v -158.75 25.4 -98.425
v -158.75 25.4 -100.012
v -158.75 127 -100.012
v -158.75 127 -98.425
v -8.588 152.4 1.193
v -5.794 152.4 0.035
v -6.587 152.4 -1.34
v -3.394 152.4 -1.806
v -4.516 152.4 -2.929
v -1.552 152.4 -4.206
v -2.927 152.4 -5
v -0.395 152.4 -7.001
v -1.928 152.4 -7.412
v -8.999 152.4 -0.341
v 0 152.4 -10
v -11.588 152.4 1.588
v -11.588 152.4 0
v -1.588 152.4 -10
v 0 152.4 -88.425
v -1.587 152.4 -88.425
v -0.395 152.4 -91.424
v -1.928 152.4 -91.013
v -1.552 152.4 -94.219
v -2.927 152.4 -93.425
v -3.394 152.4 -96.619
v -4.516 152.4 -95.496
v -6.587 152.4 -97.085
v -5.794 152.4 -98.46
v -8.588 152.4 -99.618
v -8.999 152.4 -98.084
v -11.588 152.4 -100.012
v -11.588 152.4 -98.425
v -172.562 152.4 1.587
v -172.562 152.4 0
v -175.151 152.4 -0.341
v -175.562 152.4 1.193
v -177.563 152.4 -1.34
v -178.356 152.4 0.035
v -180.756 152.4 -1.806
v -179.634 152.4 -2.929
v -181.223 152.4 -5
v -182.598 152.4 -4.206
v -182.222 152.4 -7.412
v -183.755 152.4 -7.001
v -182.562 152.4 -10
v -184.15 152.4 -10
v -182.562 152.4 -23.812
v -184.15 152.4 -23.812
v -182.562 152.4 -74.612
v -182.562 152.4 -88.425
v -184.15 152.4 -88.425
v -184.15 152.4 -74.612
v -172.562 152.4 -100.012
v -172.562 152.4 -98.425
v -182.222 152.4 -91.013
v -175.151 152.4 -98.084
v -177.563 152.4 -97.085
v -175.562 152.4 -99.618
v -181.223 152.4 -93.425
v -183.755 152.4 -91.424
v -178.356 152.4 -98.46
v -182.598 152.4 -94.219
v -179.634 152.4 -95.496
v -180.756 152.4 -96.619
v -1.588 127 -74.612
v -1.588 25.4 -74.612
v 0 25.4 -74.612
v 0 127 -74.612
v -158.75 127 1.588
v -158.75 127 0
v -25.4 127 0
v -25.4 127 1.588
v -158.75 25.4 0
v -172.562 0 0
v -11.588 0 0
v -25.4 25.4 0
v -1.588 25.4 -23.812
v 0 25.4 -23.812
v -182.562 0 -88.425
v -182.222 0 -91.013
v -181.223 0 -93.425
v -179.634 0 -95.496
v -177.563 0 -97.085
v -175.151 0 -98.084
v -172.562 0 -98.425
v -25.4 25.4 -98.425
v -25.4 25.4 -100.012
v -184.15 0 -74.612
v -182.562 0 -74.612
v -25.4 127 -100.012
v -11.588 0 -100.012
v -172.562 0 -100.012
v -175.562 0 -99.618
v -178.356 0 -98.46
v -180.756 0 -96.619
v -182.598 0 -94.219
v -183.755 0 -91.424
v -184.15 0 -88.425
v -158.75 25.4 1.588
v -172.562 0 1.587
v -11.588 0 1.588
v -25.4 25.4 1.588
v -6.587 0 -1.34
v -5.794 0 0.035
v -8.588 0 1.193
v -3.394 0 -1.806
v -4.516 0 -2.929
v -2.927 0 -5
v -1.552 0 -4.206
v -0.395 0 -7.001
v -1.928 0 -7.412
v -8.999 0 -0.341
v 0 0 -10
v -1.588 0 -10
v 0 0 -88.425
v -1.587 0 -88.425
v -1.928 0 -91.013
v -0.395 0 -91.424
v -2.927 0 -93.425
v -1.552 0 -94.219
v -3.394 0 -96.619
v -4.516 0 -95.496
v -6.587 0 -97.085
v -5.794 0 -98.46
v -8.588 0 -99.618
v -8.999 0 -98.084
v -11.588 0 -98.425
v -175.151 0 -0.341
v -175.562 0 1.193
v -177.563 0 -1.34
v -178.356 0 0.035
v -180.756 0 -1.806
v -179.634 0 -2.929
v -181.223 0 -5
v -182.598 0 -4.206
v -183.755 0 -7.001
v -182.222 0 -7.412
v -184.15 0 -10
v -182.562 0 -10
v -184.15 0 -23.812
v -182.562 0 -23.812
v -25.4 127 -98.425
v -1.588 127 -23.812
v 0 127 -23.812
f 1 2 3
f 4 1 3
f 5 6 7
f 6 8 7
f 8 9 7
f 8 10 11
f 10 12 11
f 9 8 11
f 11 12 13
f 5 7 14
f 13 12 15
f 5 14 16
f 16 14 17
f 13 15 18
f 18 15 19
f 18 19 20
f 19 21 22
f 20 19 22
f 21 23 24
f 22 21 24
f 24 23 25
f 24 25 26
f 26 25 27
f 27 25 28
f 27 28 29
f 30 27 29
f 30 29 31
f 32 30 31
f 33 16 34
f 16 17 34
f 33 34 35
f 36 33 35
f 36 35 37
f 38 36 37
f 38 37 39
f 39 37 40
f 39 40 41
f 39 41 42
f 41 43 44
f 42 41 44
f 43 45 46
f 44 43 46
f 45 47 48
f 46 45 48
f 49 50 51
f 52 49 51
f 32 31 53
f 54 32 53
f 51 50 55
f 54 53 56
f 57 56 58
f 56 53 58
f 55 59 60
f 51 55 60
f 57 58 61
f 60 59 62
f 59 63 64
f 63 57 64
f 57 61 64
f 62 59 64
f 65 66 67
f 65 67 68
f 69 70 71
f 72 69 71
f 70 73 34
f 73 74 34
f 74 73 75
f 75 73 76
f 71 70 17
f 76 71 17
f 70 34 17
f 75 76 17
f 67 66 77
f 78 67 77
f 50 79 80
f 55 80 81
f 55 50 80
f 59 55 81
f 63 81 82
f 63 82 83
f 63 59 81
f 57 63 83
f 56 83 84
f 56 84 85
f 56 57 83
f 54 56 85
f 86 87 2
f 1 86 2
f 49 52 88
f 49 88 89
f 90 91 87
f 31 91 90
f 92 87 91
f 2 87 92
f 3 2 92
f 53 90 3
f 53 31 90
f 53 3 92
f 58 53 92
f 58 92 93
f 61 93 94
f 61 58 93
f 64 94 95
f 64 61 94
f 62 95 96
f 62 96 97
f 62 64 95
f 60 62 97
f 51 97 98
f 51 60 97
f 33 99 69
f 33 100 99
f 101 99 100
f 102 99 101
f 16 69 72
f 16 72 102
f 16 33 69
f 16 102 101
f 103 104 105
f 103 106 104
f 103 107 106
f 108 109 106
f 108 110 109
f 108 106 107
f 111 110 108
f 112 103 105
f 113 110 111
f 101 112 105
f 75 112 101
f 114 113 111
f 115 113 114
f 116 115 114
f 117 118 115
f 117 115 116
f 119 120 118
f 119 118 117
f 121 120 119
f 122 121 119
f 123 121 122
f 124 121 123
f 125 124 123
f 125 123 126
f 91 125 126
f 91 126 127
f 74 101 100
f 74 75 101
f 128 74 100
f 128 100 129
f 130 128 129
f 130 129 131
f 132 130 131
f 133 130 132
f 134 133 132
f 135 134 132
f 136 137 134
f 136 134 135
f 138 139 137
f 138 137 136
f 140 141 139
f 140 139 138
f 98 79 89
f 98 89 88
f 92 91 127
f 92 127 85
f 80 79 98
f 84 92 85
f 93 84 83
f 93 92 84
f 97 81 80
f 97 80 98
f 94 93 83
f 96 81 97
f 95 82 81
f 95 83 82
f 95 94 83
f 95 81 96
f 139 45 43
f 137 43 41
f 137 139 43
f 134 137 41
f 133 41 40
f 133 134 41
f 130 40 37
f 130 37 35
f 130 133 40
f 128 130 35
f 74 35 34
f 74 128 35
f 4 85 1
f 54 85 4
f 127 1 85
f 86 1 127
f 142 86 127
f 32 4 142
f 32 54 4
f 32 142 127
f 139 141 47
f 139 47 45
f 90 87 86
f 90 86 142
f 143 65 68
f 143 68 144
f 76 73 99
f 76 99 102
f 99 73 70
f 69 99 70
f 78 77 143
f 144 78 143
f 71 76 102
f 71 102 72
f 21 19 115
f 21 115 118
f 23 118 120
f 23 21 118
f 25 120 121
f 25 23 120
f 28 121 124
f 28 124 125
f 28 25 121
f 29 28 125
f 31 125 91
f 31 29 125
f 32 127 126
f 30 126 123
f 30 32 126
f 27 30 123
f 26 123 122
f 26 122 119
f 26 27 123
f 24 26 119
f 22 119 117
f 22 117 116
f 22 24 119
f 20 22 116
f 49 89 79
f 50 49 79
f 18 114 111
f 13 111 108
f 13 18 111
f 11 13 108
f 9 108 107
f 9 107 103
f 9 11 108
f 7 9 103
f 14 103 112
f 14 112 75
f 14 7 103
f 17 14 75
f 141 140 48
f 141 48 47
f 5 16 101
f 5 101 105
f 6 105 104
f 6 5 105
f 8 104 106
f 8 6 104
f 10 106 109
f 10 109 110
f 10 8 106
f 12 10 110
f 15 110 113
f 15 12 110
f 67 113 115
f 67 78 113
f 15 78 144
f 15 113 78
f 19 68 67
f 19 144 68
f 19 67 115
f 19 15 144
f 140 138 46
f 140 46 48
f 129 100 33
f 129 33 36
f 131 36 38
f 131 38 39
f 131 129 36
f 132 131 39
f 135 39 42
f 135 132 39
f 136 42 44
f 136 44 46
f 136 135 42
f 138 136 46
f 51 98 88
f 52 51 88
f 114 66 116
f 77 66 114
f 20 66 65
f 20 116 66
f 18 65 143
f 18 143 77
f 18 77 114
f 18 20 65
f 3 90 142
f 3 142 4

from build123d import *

# Parameters (mm, degrees)
SKETCH1_W                    = 184.15
SKETCH1_H                    = 152.4
SKETCH1_W_2                  = 133.35
SKETCH1_H_2                  = 101.6
BOSS_EXTRUDE1_DEPTH          = 1.5875
EDGE_FLANGE1_STRIP_W         = 26.35
EDGE_FLANGE1_STRIP_H         = 1.5875
EDGE_FLANGE1_STRIP_CUT_DEPTH = 152.4
EDGE_FLANGE1_DEPTH           = 152.4
EDGE_FLANGE2_STRIP_W         = 26.35
EDGE_FLANGE2_STRIP_H         = 1.5875
EDGE_FLANGE2_STRIP_CUT_DEPTH = 152.4
EDGE_FLANGE2_DEPTH           = 152.4
SKETCH16_W                   = 133.35
SKETCH16_H                   = 101.6
CUT_EXTRUDE1_DEPTH           = 1.5875
SKETCH17_W                   = 50.8
SKETCH17_H                   = 101.6
CUT_EXTRUDE2_DEPTH           = 1.5875
EDGE_FLANGE3_STRIP_W         = 26.35
EDGE_FLANGE3_STRIP_H         = 1.5875
EDGE_FLANGE3_STRIP_CUT_DEPTH = 152.4
EDGE_FLANGE3_DEPTH           = 152.4
EDGE_FLANGE4_STRIP_W         = 26.35
EDGE_FLANGE4_STRIP_H         = 1.5875
EDGE_FLANGE4_STRIP_CUT_DEPTH = 152.4
EDGE_FLANGE4_DEPTH           = 152.4


# Sheet-metal steps are written as plain solids
with BuildPart() as part:
    # Sketch1 → Boss-Extrude1 (new body)
    with BuildSketch(Plane.XY):
        with Locations((-92.075, 76.2)):
            Rectangle(SKETCH1_W, SKETCH1_H)
        with Locations((-92.075, 76.2)):
            Rectangle(SKETCH1_W_2, SKETCH1_H_2, mode=Mode.SUBTRACT)
    extrude(amount=BOSS_EXTRUDE1_DEPTH)

    # Edge-Flange1 strip (across the edge) → Edge-Flange1 strip cut (cut)
    with BuildSketch(Plane(origin=(0, 152.4, 0), x_dir=(-1, 0, 0), z_dir=(0, -1, 0))):
        with Locations((-1.5875, -0.79375)):
            Rectangle(EDGE_FLANGE1_STRIP_W, EDGE_FLANGE1_STRIP_H)
    extrude(amount=EDGE_FLANGE1_STRIP_CUT_DEPTH, mode=Mode.SUBTRACT)

    # Edge-Flange1 section (across the edge) → Edge-Flange1 (add)
    with BuildSketch(Plane(origin=(0, 152.4, 0), x_dir=(-1, 0, 0), z_dir=(0, -1, 0))):
        with BuildLine():
            Line((0, 10), (0, 100.0125))
            Line((0, 100.0125), (1.5875, 100.0125))
            Line((1.5875, 100.0125), (1.5875, 10))
            ThreePointArc((1.5875, 10), (4.516432188, 2.928932188), (11.5875, 0))
            Line((11.5875, 0), (11.5875, -1.5875))
            ThreePointArc((11.5875, -1.5875), (3.393900173, 1.806400173), (0, 10))
        make_face()
    extrude(amount=EDGE_FLANGE1_DEPTH)

    # Edge-Flange2 strip (across the edge) → Edge-Flange2 strip cut (cut)
    with BuildSketch(Plane(origin=(-1.5875, 152.4, -100.0125), x_dir=(0, 0, 1), z_dir=(0, -1, 0))):
        with Locations((-1.5875, -0.79375)):
            Rectangle(EDGE_FLANGE2_STRIP_W, EDGE_FLANGE2_STRIP_H)
    extrude(amount=EDGE_FLANGE2_STRIP_CUT_DEPTH, mode=Mode.SUBTRACT)

    # Edge-Flange2 section (across the edge) → Edge-Flange2 (add)
    with BuildSketch(Plane(origin=(-1.5875, 152.4, -100.0125), x_dir=(0, 0, 1), z_dir=(0, -1, 0))):
        with BuildLine():
            Line((0, 10), (0, 182.5625))
            Line((0, 182.5625), (1.5875, 182.5625))
            Line((1.5875, 182.5625), (1.5875, 10))
            ThreePointArc((1.5875, 10), (4.516432188, 2.928932188), (11.5875, 0))
            Line((11.5875, 0), (11.5875, -1.5875))
            ThreePointArc((11.5875, -1.5875), (3.393900173, 1.806400173), (0, 10))
        make_face()
    extrude(amount=EDGE_FLANGE2_DEPTH)

    # Sketch16 → Cut-Extrude1 (cut)
    with BuildSketch(Plane(origin=(0, 0, -100.0125), x_dir=(-1, 0, 0), z_dir=(0, 0, -1))):
        with Locations((92.075, 76.2)):
            Rectangle(SKETCH16_W, SKETCH16_H)
    extrude(amount=-CUT_EXTRUDE1_DEPTH, mode=Mode.SUBTRACT)

    # Sketch17 → Cut-Extrude2 (cut)
    with BuildSketch(Plane.ZY.offset(1.5875)):
        with Locations((-49.2125, 76.2)):
            Rectangle(SKETCH17_W, SKETCH17_H)
    extrude(amount=-CUT_EXTRUDE2_DEPTH, mode=Mode.SUBTRACT)

    # Edge-Flange3 strip (across the edge) → Edge-Flange3 strip cut (cut)
    with BuildSketch(Plane(origin=(-184.15, 152.4, -98.425), x_dir=(1, 0, 0), z_dir=(0, -1, 0))):
        with Locations((-1.5875, -0.79375)):
            Rectangle(EDGE_FLANGE3_STRIP_W, EDGE_FLANGE3_STRIP_H)
    extrude(amount=EDGE_FLANGE3_STRIP_CUT_DEPTH, mode=Mode.SUBTRACT)

    # Edge-Flange3 section (across the edge) → Edge-Flange3 (add)
    with BuildSketch(Plane(origin=(-184.15, 152.4, -98.425), x_dir=(1, 0, 0), z_dir=(0, -1, 0))):
        with BuildLine():
            Line((0, 10), (0, 23.8125))
            Line((0, 23.8125), (1.5875, 23.8125))
            Line((1.5875, 23.8125), (1.5875, 10))
            ThreePointArc((1.5875, 10), (4.516432188, 2.928932188), (11.5875, 0))
            Line((11.5875, 0), (11.5875, -1.5875))
            ThreePointArc((11.5875, -1.5875), (3.393900173, 1.806400173), (0, 10))
        make_face()
    extrude(amount=EDGE_FLANGE3_DEPTH)

    # Edge-Flange4 strip (across the edge) → Edge-Flange4 strip cut (cut)
    with BuildSketch(Plane(origin=(-184.15, 0, 0), x_dir=(1, 0, 0), z_dir=(0, 1, 0))):
        with Locations((-1.5875, -0.79375)):
            Rectangle(EDGE_FLANGE4_STRIP_W, EDGE_FLANGE4_STRIP_H)
    extrude(amount=EDGE_FLANGE4_STRIP_CUT_DEPTH, mode=Mode.SUBTRACT)

    # Edge-Flange4 section (across the edge) → Edge-Flange4 (add)
    with BuildSketch(Plane(origin=(-184.15, 0, 0), x_dir=(1, 0, 0), z_dir=(0, 1, 0))):
        with BuildLine():
            Line((0, 10), (0, 23.8125))
            Line((0, 23.8125), (1.5875, 23.8125))
            Line((1.5875, 23.8125), (1.5875, 10))
            ThreePointArc((1.5875, 10), (4.516432188, 2.928932188), (11.5875, 0))
            Line((11.5875, 0), (11.5875, -1.5875))
            ThreePointArc((11.5875, -1.5875), (3.393900173, 1.806400173), (0, 10))
        make_face()
    extrude(amount=EDGE_FLANGE4_DEPTH)


solid = part.part
